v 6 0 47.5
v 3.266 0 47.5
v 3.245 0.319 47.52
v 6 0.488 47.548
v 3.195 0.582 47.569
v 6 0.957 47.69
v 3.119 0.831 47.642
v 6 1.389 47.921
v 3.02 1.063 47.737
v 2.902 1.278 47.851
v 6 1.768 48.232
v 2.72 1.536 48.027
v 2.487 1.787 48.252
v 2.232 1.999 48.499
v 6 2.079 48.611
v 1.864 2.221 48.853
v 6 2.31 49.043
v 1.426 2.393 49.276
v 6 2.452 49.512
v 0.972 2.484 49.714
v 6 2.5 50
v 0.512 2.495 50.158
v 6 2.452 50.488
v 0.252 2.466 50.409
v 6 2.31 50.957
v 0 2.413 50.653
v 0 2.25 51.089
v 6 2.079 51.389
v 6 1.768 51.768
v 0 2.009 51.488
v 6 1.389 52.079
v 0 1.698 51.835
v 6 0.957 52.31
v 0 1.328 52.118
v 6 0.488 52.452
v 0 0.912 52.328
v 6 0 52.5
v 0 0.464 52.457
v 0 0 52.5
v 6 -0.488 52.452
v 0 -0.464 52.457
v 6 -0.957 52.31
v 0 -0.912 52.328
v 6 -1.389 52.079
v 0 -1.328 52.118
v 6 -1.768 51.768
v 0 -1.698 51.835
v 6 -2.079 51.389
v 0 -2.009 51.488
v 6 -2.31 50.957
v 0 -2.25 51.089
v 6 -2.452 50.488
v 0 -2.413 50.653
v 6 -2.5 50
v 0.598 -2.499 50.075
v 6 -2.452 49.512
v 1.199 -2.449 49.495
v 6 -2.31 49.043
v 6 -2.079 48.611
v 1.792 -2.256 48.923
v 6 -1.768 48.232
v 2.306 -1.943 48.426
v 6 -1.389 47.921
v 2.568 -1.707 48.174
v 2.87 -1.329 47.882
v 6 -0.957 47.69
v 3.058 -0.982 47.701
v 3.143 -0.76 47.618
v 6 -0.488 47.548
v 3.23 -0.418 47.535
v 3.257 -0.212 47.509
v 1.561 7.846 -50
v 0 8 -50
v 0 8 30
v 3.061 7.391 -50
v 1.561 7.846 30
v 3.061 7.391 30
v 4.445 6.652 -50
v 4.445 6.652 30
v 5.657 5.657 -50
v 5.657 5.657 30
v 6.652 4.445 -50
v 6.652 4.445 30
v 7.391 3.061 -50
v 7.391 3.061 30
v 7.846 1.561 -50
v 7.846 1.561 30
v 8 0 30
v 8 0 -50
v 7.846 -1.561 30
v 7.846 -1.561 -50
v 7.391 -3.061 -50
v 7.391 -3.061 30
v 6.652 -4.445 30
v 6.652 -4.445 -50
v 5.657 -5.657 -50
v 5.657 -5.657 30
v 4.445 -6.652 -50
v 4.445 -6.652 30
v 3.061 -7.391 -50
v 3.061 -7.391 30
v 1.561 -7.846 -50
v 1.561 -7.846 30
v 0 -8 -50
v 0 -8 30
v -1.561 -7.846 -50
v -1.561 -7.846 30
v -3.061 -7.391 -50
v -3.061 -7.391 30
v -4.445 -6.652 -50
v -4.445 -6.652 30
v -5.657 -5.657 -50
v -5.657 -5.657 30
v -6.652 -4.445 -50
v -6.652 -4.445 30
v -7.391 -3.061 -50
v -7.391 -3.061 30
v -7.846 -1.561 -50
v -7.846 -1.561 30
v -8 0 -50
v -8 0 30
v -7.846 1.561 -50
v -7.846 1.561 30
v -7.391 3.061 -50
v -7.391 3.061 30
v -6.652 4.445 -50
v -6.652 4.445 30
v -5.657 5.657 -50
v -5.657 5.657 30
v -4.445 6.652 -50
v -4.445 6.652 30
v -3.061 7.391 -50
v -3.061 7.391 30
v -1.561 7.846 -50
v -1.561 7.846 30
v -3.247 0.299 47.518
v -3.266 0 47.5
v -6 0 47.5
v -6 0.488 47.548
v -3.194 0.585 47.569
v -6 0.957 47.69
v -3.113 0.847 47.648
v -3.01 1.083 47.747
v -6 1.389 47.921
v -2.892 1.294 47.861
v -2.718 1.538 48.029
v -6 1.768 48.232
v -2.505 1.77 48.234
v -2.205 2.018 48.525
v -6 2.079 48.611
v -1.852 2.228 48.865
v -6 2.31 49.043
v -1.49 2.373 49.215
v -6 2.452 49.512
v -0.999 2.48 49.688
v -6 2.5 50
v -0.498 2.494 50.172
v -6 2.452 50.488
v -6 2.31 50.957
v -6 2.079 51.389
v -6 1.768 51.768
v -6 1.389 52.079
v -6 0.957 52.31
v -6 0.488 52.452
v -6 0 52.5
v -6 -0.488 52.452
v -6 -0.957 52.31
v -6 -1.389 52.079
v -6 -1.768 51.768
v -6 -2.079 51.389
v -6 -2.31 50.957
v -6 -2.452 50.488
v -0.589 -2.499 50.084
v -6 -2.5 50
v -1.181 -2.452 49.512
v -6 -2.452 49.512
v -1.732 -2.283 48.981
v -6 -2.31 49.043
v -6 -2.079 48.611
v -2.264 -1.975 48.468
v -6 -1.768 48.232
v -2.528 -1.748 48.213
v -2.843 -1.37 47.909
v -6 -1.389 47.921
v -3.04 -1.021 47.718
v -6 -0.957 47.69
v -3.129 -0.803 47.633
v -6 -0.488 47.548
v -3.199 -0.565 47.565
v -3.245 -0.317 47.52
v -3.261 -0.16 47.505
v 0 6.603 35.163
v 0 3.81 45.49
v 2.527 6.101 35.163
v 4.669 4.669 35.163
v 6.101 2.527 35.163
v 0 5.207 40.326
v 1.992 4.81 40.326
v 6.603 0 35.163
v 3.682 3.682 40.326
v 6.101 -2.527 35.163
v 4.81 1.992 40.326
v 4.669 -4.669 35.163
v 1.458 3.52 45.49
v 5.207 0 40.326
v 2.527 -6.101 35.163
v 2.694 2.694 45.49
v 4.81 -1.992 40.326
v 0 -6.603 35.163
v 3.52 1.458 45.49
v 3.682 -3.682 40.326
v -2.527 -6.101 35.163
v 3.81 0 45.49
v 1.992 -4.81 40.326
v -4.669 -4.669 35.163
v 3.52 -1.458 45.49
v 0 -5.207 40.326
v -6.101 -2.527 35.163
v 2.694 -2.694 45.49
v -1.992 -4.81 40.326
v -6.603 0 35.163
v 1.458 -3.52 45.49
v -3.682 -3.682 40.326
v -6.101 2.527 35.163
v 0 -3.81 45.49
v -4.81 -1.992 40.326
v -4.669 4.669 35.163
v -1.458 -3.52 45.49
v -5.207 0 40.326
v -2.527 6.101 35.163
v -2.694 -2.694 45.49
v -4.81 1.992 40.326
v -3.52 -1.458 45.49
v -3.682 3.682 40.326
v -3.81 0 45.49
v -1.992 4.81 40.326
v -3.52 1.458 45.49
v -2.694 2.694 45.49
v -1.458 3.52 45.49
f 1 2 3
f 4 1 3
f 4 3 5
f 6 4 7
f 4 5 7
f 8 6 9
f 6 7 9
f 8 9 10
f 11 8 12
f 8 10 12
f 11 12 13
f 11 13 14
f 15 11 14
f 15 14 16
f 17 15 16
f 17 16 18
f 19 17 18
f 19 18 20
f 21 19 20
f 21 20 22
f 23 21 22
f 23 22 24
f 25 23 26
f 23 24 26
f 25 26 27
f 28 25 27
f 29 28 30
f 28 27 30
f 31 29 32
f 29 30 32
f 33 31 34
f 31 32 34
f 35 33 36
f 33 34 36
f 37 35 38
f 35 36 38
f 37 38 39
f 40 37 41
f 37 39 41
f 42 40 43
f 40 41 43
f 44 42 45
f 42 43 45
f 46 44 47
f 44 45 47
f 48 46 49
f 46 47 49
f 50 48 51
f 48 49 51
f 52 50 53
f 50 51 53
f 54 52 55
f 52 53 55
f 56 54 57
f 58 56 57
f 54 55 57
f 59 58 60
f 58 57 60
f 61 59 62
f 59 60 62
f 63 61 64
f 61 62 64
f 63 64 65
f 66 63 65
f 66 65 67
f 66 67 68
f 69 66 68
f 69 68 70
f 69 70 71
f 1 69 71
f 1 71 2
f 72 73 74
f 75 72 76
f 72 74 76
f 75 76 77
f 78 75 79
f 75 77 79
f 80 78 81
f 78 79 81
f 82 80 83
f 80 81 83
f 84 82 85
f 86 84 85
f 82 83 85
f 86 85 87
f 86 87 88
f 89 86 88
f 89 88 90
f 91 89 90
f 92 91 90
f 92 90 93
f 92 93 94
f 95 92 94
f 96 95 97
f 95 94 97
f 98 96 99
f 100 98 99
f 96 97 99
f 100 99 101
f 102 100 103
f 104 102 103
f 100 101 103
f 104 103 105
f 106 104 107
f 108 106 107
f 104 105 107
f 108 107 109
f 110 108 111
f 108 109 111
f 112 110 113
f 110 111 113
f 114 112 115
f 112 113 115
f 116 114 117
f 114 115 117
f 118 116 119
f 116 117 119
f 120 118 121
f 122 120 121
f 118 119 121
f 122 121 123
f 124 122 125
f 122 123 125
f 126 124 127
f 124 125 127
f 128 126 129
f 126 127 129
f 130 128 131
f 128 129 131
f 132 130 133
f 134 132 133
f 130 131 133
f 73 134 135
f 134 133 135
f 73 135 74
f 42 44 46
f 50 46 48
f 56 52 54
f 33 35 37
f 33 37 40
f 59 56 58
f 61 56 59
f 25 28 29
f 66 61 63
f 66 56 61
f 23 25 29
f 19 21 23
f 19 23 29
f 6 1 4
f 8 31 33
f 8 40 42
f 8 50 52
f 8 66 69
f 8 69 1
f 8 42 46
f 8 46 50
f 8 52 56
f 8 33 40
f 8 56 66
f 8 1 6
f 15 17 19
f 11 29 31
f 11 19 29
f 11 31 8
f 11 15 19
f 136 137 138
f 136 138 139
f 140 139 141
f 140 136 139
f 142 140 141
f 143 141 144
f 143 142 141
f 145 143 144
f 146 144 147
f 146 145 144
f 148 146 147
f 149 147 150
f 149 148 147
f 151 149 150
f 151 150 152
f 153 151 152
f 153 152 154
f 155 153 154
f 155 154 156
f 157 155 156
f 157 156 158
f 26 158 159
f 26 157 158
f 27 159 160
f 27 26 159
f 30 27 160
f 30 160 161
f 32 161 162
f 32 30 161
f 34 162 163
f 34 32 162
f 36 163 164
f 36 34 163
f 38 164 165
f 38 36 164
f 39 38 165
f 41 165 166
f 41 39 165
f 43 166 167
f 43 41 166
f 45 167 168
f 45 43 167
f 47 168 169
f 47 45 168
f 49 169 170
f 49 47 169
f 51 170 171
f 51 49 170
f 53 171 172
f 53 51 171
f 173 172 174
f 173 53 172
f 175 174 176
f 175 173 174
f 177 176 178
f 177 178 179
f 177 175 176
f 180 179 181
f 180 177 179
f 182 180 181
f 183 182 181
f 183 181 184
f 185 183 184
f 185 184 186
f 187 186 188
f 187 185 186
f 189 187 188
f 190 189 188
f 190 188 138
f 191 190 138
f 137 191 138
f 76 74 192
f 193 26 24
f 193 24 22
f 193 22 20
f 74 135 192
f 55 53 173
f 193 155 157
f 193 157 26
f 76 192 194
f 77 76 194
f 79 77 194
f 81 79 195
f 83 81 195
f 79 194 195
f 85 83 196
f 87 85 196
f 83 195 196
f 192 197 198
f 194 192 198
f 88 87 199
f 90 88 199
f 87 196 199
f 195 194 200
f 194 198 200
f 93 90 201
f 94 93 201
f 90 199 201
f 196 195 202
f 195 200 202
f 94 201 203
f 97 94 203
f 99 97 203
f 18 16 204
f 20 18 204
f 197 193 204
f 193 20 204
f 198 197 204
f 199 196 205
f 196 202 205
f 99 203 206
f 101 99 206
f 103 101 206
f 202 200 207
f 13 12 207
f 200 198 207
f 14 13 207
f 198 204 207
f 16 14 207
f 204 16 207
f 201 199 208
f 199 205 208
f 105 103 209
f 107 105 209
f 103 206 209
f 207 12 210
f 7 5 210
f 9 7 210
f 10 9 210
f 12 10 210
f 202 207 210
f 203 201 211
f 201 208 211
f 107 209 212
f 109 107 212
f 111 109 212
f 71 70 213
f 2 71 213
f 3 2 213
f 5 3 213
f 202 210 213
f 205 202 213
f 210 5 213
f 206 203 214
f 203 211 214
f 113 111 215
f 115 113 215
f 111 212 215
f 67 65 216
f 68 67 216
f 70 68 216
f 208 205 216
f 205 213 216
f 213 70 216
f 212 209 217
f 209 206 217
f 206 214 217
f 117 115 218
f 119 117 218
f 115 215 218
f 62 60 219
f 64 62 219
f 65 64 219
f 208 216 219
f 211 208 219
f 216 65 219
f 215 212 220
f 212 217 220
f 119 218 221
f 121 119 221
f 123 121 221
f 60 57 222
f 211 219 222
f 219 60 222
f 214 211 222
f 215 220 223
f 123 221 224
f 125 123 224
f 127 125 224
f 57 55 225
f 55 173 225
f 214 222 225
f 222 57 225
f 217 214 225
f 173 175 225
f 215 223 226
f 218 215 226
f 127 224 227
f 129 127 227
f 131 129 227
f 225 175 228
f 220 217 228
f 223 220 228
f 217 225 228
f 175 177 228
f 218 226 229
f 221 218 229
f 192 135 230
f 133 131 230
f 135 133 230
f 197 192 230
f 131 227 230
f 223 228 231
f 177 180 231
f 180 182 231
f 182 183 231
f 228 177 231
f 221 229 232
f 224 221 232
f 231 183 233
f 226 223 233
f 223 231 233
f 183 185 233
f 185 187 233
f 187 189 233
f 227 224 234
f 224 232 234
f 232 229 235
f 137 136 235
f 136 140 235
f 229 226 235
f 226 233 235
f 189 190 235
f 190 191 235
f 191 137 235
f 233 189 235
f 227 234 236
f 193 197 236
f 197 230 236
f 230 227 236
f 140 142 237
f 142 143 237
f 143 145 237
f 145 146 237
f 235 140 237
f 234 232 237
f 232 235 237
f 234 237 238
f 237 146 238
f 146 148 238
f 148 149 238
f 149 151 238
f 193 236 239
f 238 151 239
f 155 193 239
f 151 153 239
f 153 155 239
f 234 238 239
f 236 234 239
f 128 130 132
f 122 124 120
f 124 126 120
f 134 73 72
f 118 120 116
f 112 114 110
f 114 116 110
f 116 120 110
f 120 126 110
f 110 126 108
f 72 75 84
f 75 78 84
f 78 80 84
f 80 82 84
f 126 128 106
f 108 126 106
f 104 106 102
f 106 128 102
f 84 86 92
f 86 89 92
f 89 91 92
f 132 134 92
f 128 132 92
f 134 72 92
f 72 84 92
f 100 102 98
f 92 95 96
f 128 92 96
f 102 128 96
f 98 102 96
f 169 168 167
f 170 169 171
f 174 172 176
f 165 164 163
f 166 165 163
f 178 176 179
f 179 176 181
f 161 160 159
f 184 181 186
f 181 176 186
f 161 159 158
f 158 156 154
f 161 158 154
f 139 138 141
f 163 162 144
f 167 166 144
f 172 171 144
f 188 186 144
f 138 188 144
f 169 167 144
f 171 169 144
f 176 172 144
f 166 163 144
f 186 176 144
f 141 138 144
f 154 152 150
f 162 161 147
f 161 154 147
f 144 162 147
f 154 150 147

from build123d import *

# Parameters (mm, degrees)
BOSS_EXTRUDE1_DEPTH      = 6
BOSS_EXTRUDE1_DEPTH_BACK = 6
SKETCH3_R                = 2.5


with BuildPart() as part:
    # Sketch2 → Revolve1 (revolve)
    with BuildSketch(Plane(origin=(0, 0, 0), x_dir=(0, 0, -1), z_dir=(1, 0, 0))):
        with BuildLine():
            Line((50, 0), (50, 8))
            Line((50, 8), (-30, 8))
            Line((-30, 8), (-50.652805728, 2.413264321))
            ThreePointArc((-50.652805728, 2.413264321), (-51.985197008, 1.519537048), (-52.5, 0))
            Line((-52.5, 0), (50, 0))
        make_face()
    revolve(axis=Axis((0, 0, 50), (0, 0, -1)))

    # Sketch3 → Boss-Extrude1 (add, two sides: drawn at the far end of the back side and taken through both)
    with BuildSketch(Plane(origin=(0, 0, 0), x_dir=(0, 0, -1), z_dir=(1, 0, 0)).offset(-BOSS_EXTRUDE1_DEPTH_BACK)):
        with Locations((-50, 0)):
            Circle(SKETCH3_R)
    extrude(amount=BOSS_EXTRUDE1_DEPTH + BOSS_EXTRUDE1_DEPTH_BACK)


solid = part.part
